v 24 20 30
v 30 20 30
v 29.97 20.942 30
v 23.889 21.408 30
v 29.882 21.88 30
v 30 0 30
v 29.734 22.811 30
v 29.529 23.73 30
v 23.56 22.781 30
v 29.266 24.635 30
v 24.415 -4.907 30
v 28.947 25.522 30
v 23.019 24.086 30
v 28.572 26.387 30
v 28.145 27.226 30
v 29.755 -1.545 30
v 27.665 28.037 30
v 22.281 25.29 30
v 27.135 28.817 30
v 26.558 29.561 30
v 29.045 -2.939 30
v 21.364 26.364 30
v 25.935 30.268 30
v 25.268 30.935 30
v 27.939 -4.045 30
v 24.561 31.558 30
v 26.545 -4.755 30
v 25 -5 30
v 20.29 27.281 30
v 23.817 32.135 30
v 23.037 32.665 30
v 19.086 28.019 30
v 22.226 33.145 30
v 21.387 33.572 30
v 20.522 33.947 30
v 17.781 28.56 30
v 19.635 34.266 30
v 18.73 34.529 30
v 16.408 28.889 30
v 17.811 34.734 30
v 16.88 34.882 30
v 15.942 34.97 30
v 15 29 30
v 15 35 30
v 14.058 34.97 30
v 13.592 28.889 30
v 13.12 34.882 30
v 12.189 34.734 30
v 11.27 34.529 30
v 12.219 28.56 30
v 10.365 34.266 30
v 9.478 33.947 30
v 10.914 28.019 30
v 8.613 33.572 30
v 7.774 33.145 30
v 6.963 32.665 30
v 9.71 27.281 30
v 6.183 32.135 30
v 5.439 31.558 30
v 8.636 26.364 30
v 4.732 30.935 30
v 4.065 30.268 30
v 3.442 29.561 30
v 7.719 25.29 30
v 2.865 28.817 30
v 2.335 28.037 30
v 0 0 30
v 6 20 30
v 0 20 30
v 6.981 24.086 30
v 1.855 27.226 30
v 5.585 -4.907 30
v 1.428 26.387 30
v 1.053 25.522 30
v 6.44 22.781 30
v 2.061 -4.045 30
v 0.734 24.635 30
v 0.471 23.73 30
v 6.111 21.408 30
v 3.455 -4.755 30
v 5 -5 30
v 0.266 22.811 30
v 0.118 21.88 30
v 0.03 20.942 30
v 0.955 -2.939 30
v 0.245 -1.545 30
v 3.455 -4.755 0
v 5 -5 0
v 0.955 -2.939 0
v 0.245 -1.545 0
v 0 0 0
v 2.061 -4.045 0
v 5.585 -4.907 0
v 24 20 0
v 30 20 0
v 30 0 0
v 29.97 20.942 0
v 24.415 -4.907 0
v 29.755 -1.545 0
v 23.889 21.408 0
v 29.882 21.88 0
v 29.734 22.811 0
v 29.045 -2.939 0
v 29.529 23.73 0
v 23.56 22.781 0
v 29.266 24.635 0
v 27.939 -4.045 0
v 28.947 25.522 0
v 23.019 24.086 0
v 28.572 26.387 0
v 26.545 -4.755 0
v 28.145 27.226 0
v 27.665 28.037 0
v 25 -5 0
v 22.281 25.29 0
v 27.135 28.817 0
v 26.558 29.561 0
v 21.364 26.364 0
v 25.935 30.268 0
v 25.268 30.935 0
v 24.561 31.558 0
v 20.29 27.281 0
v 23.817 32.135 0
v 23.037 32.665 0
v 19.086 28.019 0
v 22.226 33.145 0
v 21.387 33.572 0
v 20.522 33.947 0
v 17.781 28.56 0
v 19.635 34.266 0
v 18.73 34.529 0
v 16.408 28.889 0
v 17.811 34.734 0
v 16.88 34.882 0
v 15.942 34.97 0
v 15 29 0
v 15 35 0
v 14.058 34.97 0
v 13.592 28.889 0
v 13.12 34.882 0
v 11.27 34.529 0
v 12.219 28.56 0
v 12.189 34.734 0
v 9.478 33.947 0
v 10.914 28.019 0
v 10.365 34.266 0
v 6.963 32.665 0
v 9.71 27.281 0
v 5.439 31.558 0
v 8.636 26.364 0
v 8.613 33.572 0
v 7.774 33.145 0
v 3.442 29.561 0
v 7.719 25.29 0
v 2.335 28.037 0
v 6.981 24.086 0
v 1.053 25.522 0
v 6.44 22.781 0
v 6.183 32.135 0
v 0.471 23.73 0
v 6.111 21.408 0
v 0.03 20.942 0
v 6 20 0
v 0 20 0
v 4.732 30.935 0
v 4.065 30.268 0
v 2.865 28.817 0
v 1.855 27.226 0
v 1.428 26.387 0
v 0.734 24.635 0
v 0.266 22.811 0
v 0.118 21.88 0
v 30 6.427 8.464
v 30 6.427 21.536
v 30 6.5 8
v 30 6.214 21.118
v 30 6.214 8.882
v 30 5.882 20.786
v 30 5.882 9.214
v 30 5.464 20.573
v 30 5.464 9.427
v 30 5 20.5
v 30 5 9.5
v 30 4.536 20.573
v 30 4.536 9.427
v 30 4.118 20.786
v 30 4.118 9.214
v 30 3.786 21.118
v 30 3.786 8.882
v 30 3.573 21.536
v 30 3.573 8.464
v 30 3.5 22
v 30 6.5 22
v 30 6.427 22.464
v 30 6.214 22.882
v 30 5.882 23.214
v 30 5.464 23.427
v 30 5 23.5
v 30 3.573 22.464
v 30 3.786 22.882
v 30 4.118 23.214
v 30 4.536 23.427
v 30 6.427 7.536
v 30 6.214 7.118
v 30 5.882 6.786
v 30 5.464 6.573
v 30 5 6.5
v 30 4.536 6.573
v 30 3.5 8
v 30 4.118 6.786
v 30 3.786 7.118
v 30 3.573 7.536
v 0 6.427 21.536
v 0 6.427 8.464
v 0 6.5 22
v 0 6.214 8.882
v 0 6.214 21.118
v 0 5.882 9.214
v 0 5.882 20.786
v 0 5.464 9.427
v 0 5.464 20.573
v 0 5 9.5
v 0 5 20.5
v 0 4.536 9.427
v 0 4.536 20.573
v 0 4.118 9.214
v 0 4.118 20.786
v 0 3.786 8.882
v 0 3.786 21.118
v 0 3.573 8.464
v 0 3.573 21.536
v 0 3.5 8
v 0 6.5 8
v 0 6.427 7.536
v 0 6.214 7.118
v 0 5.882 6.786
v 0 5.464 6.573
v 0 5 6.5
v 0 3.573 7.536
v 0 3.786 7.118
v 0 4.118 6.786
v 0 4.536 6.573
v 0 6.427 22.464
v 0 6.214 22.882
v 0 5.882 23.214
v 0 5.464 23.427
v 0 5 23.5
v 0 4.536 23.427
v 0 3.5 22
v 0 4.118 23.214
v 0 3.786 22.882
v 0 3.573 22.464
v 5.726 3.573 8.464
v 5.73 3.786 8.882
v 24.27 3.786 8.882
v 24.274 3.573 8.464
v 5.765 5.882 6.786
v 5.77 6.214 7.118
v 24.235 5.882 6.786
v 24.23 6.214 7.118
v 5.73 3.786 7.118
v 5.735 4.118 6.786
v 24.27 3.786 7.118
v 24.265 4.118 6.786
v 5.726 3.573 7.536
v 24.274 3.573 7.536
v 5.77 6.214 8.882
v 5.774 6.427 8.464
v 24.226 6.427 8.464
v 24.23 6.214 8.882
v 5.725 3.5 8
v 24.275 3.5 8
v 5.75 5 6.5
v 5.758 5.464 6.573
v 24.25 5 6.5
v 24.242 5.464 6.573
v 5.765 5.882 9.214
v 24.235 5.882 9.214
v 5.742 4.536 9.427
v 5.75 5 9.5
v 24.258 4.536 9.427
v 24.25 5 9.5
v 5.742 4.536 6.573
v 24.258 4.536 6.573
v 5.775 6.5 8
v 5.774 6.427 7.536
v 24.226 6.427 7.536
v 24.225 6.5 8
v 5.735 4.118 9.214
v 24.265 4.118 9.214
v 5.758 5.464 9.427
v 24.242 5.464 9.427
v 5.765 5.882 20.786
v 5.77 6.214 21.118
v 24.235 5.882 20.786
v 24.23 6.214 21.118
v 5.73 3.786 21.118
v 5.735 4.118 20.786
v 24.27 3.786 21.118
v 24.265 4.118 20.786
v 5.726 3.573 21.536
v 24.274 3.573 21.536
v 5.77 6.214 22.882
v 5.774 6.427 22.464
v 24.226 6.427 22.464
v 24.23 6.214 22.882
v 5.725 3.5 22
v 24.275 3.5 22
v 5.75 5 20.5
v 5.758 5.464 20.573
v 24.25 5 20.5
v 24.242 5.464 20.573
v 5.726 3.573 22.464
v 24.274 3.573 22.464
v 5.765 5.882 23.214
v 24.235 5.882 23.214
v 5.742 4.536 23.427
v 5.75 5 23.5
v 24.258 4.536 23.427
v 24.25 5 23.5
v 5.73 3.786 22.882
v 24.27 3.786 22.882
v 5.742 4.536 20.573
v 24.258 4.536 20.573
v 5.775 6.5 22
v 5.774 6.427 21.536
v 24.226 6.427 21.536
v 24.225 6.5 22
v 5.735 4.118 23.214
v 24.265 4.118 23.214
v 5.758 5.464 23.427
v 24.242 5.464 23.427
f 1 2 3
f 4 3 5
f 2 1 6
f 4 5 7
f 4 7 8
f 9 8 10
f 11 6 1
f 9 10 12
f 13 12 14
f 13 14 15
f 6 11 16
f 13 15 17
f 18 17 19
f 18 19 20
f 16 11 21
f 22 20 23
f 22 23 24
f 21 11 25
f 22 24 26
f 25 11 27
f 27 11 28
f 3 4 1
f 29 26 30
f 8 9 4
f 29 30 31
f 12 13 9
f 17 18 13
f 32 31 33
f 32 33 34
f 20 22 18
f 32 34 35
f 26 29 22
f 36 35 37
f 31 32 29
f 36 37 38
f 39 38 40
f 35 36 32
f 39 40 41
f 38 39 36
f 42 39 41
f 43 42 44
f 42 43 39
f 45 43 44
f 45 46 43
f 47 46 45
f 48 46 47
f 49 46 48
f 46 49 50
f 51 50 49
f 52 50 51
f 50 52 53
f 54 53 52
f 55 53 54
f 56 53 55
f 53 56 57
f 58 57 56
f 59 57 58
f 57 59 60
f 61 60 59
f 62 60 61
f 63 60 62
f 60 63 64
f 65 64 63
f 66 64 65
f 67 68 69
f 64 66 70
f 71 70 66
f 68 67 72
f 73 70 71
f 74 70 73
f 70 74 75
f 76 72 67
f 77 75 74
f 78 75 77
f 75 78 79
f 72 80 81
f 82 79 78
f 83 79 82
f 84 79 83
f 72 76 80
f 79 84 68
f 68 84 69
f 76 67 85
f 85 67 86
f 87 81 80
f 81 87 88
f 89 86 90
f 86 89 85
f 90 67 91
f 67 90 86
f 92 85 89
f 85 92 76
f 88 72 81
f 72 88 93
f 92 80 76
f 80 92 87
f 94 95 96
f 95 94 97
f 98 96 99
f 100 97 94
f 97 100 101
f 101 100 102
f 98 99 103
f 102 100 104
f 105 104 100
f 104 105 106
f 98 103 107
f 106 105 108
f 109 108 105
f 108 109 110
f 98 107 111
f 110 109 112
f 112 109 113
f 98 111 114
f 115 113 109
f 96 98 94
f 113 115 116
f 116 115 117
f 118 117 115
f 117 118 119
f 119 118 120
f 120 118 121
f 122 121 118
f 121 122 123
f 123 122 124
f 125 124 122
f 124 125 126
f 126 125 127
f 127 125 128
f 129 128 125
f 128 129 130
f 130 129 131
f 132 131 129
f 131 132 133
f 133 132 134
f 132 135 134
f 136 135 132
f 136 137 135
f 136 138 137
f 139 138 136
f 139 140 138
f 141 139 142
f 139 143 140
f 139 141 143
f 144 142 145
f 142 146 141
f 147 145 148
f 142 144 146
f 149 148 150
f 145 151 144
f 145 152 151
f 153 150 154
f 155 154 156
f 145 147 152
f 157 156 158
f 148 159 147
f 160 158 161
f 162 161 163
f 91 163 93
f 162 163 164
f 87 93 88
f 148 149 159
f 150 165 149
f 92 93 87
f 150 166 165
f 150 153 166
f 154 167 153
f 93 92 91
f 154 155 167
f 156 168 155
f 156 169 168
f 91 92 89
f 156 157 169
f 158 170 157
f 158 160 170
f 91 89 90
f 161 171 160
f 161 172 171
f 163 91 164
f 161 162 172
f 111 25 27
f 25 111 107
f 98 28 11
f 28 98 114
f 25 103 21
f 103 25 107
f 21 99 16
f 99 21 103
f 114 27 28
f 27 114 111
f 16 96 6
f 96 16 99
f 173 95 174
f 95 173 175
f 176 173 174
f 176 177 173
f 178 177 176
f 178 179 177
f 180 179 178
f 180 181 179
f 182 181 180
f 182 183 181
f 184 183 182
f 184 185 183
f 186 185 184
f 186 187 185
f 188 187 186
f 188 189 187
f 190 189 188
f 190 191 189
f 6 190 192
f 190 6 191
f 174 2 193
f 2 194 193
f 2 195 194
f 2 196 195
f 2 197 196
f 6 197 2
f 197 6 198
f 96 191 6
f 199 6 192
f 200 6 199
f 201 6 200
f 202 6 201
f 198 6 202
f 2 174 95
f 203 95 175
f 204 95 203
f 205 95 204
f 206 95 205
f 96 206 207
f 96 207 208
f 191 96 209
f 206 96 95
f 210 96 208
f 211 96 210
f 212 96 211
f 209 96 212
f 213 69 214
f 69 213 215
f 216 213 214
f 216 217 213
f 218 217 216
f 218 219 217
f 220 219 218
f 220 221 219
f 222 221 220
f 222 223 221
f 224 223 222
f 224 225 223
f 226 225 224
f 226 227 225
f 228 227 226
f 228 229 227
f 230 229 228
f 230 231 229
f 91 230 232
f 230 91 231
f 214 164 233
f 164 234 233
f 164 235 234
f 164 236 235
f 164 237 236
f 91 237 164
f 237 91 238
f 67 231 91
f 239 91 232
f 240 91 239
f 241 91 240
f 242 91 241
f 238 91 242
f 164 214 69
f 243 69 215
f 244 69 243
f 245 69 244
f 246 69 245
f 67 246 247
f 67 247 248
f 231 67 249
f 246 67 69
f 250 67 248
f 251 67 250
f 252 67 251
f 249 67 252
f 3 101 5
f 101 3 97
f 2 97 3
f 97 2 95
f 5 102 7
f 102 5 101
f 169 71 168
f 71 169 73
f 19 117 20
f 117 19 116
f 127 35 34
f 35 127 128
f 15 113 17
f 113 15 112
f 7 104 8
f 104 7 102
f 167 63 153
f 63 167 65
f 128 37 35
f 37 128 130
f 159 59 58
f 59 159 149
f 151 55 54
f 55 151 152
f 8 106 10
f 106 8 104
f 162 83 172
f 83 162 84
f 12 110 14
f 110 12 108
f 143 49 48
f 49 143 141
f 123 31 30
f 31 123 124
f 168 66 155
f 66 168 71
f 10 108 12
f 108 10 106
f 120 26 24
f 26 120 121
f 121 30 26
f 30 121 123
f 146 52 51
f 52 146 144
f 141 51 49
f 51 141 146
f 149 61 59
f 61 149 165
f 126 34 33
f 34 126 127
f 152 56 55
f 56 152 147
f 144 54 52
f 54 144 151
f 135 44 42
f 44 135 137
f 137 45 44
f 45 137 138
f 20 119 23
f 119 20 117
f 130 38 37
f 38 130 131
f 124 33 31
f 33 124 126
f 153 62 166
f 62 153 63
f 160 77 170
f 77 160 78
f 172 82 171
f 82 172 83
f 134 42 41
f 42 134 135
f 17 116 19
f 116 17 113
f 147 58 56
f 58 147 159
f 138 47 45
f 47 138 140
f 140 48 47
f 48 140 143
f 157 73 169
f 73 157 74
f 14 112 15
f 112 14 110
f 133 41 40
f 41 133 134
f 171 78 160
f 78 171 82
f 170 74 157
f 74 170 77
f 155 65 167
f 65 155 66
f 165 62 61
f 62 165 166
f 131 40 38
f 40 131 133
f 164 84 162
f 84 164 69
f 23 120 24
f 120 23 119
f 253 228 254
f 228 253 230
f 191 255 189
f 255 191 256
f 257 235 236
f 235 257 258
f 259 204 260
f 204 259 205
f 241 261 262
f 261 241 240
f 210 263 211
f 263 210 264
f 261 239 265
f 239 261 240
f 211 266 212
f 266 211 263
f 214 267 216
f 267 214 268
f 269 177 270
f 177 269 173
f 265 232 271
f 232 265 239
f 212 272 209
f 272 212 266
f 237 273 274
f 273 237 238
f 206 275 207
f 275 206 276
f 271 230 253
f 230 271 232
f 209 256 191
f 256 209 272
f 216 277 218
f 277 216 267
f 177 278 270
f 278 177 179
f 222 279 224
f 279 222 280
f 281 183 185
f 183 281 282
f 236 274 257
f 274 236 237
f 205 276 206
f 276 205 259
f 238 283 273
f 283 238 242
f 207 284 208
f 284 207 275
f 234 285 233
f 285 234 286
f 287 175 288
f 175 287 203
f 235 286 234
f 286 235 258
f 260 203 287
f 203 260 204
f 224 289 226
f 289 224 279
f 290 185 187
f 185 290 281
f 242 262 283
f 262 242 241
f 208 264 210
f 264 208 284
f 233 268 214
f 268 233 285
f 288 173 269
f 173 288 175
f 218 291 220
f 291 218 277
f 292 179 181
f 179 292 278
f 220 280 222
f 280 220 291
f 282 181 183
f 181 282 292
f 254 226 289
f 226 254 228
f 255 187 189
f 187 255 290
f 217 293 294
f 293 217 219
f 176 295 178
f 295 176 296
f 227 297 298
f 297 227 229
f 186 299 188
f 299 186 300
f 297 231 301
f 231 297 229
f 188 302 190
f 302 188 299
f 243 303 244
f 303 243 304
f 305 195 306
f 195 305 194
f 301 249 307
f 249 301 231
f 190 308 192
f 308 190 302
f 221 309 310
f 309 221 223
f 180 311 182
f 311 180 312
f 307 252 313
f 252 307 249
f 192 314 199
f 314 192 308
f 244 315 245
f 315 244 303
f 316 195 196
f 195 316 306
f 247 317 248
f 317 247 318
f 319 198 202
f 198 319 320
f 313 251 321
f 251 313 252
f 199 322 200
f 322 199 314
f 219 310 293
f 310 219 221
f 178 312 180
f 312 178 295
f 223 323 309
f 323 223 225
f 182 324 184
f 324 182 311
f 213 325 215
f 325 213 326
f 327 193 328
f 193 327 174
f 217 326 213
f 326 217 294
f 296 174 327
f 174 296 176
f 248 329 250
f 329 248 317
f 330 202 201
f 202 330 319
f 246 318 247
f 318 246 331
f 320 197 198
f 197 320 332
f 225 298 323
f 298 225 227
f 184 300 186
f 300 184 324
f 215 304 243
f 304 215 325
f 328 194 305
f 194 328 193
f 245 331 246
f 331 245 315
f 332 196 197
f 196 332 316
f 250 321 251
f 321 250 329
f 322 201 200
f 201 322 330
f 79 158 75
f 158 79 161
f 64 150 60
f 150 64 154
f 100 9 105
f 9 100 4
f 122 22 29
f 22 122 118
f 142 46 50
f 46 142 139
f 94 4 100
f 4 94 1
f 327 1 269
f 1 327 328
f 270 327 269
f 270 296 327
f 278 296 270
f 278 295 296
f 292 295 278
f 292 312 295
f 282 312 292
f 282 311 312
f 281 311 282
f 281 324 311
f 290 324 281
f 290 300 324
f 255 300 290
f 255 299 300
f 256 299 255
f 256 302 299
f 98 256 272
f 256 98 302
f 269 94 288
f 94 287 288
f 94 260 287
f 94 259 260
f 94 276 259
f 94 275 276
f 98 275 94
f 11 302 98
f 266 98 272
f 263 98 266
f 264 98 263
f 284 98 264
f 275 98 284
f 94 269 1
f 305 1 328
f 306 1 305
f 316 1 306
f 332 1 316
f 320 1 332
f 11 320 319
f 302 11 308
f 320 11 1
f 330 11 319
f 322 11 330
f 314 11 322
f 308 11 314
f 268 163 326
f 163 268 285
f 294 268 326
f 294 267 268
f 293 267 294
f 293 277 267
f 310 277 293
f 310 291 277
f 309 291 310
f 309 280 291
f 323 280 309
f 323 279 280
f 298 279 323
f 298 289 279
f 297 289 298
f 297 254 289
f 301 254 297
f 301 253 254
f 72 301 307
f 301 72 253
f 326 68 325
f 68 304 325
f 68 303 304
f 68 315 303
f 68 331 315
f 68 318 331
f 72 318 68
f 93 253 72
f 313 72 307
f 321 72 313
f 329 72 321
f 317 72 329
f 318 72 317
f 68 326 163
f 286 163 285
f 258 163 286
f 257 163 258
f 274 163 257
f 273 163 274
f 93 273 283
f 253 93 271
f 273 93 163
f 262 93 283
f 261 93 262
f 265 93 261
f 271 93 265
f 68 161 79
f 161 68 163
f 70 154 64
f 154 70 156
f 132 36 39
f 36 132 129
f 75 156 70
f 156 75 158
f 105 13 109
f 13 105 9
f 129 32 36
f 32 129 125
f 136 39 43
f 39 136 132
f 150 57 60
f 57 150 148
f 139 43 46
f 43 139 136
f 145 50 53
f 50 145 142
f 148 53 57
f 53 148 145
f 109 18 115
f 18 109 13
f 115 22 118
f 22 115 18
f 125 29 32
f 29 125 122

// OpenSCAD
id1=18;
id2=20;
thick=10;
tw=id2+thick;
th=20;
difference(){
  union() {
    translate([0,0]) cube([tw,th,30]);
    translate([tw/2,th]) cylinder(d=id2+thick,h=30,$fn=100);
    for(x=[thick/2,tw-thick/2])
      translate([x,0]) cylinder(d=thick,h=30,$fn=20);
  }
  translate([tw/2,th,-.01]) linear_extrude(30.02) {
    hull() {
    circle(d=id1,$fn=40);
    translate([0,-60]) circle(d=id2,$fn=50);
    }
  }
  for(z=[8,22]) translate([-.01,5,z]) rotate([0,90,0]) cylinder(d=3,h=30.02,$fn=20);
}
